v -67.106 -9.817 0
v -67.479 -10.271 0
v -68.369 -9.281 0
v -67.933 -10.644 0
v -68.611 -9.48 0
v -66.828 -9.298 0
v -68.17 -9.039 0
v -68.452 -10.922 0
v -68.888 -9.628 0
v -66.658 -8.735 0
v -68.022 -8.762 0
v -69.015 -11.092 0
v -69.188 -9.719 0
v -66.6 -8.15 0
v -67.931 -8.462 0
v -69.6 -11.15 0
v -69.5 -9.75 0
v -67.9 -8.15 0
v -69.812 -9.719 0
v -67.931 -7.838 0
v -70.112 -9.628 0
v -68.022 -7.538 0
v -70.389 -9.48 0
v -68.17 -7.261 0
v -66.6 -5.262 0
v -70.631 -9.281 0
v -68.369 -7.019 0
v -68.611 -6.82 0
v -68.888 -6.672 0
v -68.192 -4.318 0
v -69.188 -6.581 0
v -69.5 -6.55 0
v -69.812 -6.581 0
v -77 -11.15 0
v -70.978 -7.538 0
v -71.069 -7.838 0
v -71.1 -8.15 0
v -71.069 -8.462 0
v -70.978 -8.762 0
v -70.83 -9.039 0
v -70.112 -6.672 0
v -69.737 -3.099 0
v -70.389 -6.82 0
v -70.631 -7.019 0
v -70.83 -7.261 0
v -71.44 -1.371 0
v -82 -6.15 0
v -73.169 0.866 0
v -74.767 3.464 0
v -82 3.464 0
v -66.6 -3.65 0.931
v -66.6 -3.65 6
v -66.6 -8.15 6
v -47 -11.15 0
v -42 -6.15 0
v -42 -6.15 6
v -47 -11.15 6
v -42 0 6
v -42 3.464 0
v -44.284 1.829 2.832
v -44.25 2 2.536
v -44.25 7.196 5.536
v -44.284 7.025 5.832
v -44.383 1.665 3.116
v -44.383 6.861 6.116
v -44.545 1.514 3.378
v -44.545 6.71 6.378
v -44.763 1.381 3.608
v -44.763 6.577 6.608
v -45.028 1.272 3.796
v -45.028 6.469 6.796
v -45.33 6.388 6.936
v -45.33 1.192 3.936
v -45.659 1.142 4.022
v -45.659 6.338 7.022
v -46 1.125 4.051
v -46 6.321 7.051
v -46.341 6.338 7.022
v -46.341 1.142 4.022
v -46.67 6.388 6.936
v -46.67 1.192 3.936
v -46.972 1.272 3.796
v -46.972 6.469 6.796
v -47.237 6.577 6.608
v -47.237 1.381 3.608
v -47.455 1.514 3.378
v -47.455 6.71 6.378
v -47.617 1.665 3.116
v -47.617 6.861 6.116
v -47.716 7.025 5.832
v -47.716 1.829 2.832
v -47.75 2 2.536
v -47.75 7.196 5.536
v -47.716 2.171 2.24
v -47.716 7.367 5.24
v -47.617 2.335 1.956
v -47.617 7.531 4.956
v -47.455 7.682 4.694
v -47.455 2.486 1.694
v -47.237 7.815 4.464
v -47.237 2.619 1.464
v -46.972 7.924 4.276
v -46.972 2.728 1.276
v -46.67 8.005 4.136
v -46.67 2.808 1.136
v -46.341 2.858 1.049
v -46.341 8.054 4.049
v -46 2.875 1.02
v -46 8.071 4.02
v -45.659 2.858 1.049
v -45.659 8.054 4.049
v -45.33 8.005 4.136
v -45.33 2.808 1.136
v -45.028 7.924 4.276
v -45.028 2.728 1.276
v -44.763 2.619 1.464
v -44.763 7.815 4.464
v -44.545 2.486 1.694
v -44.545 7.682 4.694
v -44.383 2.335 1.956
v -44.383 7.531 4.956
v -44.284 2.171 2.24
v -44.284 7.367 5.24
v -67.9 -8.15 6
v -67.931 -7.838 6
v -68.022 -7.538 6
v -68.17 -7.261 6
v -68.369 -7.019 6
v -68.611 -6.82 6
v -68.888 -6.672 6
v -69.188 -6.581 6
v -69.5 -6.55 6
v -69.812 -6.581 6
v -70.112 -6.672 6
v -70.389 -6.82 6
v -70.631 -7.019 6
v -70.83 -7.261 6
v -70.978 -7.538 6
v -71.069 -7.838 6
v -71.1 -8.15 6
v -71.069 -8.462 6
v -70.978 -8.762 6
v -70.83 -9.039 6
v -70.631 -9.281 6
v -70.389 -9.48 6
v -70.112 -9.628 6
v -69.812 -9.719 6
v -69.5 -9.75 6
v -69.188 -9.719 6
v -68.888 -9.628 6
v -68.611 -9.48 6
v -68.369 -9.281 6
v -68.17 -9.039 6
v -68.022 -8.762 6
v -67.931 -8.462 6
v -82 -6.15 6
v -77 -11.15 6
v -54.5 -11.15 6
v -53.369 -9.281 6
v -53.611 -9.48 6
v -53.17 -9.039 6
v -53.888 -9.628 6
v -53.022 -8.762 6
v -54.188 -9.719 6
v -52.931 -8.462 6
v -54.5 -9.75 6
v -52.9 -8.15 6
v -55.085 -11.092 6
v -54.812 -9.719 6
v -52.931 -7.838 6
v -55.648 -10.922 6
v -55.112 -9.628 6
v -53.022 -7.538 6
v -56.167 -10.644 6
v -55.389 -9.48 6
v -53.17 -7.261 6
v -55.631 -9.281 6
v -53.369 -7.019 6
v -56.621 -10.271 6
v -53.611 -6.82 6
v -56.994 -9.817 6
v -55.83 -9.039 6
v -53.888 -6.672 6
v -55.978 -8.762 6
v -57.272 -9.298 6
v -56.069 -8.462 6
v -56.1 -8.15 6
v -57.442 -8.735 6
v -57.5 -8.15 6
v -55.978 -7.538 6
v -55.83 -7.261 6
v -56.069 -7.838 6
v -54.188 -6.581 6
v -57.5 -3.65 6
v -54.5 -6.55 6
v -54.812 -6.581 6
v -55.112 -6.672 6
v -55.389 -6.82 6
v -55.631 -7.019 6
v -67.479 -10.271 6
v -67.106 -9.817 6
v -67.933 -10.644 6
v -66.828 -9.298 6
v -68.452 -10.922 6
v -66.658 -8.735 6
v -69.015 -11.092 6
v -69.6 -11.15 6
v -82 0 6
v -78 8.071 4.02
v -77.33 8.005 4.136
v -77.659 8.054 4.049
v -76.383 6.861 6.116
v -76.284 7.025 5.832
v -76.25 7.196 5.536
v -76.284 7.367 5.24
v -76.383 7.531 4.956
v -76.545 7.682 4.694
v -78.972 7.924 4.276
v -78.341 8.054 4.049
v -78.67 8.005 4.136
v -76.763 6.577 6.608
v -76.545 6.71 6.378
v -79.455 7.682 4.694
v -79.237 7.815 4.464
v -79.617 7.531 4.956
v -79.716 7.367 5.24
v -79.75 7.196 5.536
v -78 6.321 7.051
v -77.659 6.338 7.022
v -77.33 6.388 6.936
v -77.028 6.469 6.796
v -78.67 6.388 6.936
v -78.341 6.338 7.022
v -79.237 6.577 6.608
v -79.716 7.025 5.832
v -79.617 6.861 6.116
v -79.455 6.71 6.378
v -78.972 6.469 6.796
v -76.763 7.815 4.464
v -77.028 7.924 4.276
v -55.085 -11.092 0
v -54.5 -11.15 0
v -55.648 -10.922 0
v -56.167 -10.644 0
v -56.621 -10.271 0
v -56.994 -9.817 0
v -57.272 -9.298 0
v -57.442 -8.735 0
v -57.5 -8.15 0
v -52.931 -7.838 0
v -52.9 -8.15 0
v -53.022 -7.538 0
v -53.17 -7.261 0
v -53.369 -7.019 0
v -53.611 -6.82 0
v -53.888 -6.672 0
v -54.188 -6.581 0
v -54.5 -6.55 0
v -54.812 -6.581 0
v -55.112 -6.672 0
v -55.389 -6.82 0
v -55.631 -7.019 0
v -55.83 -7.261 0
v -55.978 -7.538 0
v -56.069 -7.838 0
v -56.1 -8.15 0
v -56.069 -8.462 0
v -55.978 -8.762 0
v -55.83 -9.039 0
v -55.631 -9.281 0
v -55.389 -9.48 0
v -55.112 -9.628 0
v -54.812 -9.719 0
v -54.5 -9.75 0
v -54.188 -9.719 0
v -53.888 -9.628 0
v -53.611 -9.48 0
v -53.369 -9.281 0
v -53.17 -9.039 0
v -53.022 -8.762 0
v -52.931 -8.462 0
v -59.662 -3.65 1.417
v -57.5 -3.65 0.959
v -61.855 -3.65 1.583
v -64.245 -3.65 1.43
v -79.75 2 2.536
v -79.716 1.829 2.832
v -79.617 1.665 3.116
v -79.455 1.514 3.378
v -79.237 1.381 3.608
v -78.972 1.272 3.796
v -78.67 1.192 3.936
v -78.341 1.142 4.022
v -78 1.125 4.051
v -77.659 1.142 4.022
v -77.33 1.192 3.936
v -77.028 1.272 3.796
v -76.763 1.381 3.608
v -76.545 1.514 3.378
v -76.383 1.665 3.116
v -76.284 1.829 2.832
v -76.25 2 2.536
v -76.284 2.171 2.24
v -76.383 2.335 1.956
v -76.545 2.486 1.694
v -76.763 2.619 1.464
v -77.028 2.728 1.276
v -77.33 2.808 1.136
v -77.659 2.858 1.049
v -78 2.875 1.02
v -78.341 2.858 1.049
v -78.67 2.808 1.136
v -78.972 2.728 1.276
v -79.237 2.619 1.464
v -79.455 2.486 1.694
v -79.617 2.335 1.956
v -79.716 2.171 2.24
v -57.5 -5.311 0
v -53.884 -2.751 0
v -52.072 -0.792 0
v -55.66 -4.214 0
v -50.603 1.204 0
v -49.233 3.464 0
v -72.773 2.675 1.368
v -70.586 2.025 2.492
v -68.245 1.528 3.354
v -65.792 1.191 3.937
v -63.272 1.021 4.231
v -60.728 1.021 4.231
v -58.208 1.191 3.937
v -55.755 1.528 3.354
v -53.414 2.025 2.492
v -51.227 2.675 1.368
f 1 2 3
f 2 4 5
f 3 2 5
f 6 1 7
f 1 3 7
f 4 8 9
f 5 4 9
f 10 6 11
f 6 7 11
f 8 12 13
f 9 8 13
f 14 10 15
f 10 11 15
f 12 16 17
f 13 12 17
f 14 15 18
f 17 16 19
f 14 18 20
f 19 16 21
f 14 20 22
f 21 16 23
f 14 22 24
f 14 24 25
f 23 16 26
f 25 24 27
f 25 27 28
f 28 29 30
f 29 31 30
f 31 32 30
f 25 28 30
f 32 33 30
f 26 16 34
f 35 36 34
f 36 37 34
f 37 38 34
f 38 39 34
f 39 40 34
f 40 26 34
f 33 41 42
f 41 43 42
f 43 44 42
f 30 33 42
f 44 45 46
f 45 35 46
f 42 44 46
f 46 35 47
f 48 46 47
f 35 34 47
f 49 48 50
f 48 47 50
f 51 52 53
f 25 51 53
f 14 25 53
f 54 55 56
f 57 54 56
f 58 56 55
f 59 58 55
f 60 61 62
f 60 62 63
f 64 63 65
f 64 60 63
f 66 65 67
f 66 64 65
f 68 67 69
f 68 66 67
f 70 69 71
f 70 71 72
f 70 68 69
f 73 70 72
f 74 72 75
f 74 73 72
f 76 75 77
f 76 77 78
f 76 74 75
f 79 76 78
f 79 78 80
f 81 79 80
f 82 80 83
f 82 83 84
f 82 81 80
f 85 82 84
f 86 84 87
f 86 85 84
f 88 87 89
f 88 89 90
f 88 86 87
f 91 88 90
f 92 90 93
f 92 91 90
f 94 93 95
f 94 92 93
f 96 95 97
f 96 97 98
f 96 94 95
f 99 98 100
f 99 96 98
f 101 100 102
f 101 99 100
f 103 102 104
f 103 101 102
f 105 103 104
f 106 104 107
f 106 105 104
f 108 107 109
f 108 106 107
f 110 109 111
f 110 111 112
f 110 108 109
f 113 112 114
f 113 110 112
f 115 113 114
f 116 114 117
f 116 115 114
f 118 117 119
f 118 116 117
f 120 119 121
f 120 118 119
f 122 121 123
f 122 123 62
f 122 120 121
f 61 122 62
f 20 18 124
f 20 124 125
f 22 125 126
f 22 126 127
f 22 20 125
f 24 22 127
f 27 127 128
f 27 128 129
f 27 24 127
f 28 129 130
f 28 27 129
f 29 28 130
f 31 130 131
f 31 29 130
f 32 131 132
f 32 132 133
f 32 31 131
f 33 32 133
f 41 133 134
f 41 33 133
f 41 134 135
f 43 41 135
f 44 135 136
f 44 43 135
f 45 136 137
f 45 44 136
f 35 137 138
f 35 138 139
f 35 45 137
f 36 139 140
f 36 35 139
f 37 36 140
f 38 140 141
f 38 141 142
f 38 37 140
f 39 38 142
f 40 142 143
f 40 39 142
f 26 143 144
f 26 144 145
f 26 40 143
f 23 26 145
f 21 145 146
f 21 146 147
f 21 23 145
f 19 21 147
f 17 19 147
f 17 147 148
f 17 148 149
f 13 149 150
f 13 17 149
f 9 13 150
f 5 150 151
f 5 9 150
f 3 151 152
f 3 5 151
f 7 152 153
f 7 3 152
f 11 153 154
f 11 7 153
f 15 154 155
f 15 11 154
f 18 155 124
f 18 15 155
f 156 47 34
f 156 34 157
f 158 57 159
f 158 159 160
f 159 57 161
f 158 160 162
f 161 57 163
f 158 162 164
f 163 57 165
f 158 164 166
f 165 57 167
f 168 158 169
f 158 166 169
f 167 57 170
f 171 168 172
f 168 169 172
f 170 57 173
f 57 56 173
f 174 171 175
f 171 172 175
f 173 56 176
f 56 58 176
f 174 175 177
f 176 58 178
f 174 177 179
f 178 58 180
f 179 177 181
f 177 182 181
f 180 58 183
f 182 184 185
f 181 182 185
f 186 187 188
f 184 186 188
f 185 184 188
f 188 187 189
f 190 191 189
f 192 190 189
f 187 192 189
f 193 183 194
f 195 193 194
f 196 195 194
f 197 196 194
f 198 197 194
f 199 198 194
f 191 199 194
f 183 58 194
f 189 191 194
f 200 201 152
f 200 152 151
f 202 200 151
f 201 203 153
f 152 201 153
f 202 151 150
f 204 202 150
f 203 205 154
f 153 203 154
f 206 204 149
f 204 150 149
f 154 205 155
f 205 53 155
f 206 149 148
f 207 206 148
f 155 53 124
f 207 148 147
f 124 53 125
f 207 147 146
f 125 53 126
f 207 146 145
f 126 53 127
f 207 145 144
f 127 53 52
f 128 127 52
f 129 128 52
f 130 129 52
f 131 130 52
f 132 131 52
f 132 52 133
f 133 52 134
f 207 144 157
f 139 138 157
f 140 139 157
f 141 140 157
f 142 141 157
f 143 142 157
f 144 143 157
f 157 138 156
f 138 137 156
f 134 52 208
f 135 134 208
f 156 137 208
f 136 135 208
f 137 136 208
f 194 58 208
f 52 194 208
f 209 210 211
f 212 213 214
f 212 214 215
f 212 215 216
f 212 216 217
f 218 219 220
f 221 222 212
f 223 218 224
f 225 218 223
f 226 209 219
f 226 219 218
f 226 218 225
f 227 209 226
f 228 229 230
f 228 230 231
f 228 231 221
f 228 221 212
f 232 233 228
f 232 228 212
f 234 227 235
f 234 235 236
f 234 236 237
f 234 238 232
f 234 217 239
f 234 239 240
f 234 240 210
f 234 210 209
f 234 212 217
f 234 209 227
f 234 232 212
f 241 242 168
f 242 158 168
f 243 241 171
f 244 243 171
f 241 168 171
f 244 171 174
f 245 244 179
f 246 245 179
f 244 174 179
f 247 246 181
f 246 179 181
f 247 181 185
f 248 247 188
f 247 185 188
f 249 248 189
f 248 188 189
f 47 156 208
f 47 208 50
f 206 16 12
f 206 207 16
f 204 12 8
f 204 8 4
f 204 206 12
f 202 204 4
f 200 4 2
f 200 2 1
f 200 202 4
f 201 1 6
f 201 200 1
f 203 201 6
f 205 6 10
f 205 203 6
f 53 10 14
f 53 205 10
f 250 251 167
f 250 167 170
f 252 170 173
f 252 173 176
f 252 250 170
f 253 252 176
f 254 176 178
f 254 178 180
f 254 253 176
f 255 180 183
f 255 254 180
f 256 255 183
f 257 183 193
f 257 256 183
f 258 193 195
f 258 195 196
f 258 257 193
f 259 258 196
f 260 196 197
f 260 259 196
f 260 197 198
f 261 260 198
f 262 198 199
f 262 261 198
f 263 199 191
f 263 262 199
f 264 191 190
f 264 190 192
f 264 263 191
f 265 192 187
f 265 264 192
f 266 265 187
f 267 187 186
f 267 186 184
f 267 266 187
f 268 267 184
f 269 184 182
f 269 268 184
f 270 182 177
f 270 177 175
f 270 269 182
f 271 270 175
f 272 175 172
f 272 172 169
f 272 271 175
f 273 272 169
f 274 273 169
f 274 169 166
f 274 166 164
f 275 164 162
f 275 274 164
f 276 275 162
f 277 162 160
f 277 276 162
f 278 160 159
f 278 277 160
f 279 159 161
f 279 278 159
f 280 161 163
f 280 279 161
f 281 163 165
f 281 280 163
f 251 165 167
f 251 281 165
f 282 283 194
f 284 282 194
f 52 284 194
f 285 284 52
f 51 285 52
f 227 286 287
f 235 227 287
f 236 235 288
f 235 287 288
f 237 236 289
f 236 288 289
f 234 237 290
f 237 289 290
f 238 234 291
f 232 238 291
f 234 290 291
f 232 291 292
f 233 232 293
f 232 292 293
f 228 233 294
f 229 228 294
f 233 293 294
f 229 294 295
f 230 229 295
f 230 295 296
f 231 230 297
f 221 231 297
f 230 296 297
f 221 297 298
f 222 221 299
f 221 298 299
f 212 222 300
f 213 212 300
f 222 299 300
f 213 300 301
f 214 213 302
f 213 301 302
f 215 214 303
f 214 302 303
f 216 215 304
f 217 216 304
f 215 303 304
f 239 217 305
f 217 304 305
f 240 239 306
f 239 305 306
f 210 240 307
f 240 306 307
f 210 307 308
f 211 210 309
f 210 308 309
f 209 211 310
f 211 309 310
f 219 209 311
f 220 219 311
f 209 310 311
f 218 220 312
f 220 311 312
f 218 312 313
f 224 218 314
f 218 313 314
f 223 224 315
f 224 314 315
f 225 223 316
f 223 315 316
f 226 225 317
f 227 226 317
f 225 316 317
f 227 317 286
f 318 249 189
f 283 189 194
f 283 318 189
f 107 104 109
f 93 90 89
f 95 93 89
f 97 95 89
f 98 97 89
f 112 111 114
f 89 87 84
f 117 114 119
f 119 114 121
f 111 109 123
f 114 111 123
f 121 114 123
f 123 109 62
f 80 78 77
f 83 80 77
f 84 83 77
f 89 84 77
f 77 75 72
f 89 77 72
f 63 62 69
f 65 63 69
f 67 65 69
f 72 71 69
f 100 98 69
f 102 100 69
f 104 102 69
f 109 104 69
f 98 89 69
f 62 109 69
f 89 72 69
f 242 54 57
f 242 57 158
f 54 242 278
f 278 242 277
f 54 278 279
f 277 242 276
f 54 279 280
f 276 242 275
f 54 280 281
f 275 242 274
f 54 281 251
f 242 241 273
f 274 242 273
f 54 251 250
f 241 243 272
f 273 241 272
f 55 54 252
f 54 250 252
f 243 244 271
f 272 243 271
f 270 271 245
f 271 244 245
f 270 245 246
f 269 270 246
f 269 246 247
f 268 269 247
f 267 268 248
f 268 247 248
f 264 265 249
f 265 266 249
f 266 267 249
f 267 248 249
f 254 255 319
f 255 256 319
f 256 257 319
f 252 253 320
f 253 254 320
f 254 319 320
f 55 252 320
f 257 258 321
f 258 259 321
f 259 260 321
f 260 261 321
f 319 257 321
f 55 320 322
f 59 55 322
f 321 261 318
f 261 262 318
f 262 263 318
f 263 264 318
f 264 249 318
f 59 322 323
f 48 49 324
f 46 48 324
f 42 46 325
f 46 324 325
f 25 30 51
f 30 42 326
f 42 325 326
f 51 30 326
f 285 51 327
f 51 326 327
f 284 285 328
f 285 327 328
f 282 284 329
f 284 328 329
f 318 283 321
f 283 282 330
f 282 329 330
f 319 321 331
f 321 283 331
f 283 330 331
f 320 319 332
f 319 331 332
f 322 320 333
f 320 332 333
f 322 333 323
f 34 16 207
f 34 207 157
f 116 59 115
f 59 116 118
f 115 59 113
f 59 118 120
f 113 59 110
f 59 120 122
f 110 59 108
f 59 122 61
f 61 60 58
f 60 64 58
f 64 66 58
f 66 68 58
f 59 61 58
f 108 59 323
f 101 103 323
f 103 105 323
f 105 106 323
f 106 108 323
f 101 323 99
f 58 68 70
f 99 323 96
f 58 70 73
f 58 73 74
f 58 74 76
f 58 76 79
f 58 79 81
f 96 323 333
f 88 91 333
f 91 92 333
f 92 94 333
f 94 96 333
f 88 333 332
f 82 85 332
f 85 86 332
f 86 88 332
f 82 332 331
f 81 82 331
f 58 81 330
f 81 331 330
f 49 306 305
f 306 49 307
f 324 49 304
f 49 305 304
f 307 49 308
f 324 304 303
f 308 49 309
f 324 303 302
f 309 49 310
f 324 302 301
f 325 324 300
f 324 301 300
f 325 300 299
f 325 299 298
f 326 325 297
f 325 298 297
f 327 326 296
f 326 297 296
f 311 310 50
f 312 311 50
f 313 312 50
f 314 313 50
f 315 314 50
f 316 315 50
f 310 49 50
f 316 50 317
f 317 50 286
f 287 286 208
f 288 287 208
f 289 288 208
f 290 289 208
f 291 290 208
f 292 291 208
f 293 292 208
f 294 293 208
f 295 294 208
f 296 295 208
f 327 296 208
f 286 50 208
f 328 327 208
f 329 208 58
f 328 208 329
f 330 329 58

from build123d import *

# Parameters (mm, degrees)
SKETCH3_R           = 1.6
BOSS_EXTRUDE1_DEPTH = 6
BOSS_EXTRUDE3_DEPTH = 40
SKETCH7_R           = 1.75
BOSS_EXTRUDE5_DEPTH = 6
CHAMFER1_SIZE       = 5
FILLET1_R           = 3
SKETCH9_R           = 19
CUT_EXTRUDE1_DEPTH  = 13.656183252


with BuildPart() as part:
    # Sketch3 → Boss-Extrude1 (new body)
    with BuildSketch(Plane.XY):
        Polygon((-42, 0), (-42, -11.15), (-57.5, -11.15), (-57.5, -3.65), (-66.6, -3.65), (-66.6, -11.15), (-82, -11.15), (-82, 0), align=None)
        with Locations((-69.5, -8.15)):
            Circle(SKETCH3_R, mode=Mode.SUBTRACT)
        with Locations((-54.5, -8.15)):
            Circle(SKETCH3_R, mode=Mode.SUBTRACT)
    extrude(amount=BOSS_EXTRUDE1_DEPTH)

    # Sketch5 → Boss-Extrude3 (add)
    with BuildSketch(Plane.ZY.offset(82)):
        Polygon((0, 0), (0, 3.464101615), (6, 0), align=None)
    extrude(amount=-BOSS_EXTRUDE3_DEPTH)

    # Sketch7 → Boss-Extrude5 (add)
    with BuildSketch(Plane(origin=(0, 4.189066469, -1.255675961), x_dir=(-1, 0, 0), z_dir=(0, 0.866025404, 0.5))):
        with Locations((78, 4.378132938)):
            Circle(SKETCH7_R)
    boss_extrude5 = extrude(amount=BOSS_EXTRUDE5_DEPTH)

    # Mirror2: Boss-Extrude5 across plane
    add(boss_extrude5.mirror(Plane(origin=(-62, 0, 0), x_dir=(0, 0, 1), z_dir=(1, 0, 0))))

    # Chamfer1
    chamfer1_edges = [part.edges().sort_by_distance(p)[0] for p in [
        (-42, -11.15, 3),
        (-82, -11.15, 3),
    ]]
    chamfer(chamfer1_edges, length=CHAMFER1_SIZE)

    # Fillet1
    fillet1_edges = [part.edges().sort_by_distance(p)[0] for p in [
        (-57.5, -11.15, 3),
        (-66.6, -11.15, 3),
    ]]
    fillet(fillet1_edges, radius=FILLET1_R)

    # Sketch9 → Cut-Extrude1 (cut, through all)
    with BuildSketch(Plane(origin=(0, 2.598076211, 1.5), x_dir=(1, 0, 0), z_dir=(0, 0.866025404, 0.5))):
        with Locations((-62, 15.803847577)):
            Circle(SKETCH9_R)
    extrude(amount=-CUT_EXTRUDE1_DEPTH, mode=Mode.SUBTRACT)


solid = part.part
